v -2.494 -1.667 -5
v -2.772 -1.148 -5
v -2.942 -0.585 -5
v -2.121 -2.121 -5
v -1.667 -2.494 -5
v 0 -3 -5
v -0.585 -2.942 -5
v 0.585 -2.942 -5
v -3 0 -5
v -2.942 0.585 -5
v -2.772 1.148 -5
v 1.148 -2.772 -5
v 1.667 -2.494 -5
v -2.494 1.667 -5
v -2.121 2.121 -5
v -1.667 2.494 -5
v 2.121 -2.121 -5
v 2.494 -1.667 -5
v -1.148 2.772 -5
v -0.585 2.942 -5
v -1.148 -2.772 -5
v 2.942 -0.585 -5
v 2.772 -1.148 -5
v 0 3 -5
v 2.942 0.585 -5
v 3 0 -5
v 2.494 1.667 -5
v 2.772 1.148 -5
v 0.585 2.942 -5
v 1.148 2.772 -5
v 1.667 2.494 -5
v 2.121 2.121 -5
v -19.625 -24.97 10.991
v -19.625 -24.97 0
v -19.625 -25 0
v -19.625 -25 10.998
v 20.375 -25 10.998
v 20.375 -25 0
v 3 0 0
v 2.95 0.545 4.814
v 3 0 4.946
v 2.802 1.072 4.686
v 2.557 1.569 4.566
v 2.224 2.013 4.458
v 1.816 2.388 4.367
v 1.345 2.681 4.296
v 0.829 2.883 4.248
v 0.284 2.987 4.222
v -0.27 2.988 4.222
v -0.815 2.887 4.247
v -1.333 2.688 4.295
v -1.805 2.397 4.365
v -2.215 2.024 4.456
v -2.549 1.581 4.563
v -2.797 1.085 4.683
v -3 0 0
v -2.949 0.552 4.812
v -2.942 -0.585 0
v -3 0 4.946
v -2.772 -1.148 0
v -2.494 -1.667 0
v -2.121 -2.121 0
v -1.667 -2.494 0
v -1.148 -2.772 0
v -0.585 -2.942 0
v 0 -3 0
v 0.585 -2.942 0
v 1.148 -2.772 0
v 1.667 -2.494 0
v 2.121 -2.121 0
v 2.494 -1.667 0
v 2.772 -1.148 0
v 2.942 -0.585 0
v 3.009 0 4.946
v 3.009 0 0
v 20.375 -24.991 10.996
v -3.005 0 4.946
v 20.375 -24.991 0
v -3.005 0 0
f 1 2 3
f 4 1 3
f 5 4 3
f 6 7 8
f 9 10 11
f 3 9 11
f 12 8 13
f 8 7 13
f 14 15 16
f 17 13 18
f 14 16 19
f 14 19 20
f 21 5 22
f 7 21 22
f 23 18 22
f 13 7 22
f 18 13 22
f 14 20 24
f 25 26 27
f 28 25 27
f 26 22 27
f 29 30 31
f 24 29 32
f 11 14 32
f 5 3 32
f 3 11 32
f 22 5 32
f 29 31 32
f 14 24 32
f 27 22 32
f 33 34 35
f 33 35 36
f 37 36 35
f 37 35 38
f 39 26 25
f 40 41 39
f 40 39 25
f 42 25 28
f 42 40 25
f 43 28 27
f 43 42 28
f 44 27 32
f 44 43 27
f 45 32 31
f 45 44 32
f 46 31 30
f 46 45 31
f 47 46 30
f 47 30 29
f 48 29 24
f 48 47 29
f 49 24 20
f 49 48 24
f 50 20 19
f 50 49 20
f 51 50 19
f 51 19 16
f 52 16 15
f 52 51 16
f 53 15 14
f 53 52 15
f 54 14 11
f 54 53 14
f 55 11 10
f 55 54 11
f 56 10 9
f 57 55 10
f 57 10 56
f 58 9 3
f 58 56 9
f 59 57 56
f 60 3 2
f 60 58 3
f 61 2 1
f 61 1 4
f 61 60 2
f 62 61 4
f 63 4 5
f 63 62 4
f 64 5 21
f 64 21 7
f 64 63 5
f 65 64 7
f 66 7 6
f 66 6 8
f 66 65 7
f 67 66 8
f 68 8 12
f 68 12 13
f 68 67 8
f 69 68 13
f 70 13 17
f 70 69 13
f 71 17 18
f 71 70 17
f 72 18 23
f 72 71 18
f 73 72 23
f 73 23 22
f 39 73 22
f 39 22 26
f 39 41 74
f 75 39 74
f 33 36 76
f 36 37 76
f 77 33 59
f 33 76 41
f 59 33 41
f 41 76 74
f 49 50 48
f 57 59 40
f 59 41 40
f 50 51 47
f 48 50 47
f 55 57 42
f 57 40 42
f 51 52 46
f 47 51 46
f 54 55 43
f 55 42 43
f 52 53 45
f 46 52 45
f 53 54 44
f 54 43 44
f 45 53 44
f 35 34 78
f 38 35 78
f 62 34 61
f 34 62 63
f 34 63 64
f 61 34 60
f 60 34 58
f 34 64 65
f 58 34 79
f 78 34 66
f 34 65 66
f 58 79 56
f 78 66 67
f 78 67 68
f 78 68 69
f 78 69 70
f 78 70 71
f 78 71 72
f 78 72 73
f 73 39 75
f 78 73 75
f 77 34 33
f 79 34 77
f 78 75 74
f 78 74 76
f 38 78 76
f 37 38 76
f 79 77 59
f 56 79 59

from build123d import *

# Parameters (mm, degrees)
F0_R     = 3
F1_DEPTH = 5
F2_W     = 40
F2_H     = 11
F3_DEPTH = 25
F5_DEPTH = 11.001
F7_DEPTH = 25


with BuildPart() as f1:
    # F0 (on Top) → F1 (new body, symmetric)
    with BuildSketch(Plane.XY):
        Circle(F0_R)
    extrude(amount=F1_DEPTH, both=True)

    # F2 (on Front) → F3 (join)
    with BuildSketch(Plane.XZ):
        with Locations((0.3750487044, 5.5)):
            Rectangle(F2_W, F2_H)
    extrude(amount=F3_DEPTH)

    # F4 (on Top) → F5 (cut, through all)
    with BuildSketch(Plane.XY):
        Polygon((-19.9439544231, -25.4493262619), (-3.0048058834, 0), (-26.9990675151, 2.6770541444), align=None)
        Polygon((32.6401479542, 2.6770541444), (3.0086771585, 0), (20.6934921443, -25.4493262619), align=None)
    extrude(amount=F5_DEPTH, mode=Mode.SUBTRACT)


with BuildPart() as f7:
    # F6 (on Right) → F7 (new body, symmetric)
    with BuildSketch(Plane.YZ):
        Polygon((6.2013822608, 13.6782731861), (-25.7219970226, 11.1731654033), (6.2013822608, 3.444124246), align=None)
    extrude(amount=F7_DEPTH, both=True)


with BuildPart() as f1_1:
    add(f1.part)

    # F8: cut F7
    add(f7.part, mode=Mode.SUBTRACT)


solid = f1_1.part
